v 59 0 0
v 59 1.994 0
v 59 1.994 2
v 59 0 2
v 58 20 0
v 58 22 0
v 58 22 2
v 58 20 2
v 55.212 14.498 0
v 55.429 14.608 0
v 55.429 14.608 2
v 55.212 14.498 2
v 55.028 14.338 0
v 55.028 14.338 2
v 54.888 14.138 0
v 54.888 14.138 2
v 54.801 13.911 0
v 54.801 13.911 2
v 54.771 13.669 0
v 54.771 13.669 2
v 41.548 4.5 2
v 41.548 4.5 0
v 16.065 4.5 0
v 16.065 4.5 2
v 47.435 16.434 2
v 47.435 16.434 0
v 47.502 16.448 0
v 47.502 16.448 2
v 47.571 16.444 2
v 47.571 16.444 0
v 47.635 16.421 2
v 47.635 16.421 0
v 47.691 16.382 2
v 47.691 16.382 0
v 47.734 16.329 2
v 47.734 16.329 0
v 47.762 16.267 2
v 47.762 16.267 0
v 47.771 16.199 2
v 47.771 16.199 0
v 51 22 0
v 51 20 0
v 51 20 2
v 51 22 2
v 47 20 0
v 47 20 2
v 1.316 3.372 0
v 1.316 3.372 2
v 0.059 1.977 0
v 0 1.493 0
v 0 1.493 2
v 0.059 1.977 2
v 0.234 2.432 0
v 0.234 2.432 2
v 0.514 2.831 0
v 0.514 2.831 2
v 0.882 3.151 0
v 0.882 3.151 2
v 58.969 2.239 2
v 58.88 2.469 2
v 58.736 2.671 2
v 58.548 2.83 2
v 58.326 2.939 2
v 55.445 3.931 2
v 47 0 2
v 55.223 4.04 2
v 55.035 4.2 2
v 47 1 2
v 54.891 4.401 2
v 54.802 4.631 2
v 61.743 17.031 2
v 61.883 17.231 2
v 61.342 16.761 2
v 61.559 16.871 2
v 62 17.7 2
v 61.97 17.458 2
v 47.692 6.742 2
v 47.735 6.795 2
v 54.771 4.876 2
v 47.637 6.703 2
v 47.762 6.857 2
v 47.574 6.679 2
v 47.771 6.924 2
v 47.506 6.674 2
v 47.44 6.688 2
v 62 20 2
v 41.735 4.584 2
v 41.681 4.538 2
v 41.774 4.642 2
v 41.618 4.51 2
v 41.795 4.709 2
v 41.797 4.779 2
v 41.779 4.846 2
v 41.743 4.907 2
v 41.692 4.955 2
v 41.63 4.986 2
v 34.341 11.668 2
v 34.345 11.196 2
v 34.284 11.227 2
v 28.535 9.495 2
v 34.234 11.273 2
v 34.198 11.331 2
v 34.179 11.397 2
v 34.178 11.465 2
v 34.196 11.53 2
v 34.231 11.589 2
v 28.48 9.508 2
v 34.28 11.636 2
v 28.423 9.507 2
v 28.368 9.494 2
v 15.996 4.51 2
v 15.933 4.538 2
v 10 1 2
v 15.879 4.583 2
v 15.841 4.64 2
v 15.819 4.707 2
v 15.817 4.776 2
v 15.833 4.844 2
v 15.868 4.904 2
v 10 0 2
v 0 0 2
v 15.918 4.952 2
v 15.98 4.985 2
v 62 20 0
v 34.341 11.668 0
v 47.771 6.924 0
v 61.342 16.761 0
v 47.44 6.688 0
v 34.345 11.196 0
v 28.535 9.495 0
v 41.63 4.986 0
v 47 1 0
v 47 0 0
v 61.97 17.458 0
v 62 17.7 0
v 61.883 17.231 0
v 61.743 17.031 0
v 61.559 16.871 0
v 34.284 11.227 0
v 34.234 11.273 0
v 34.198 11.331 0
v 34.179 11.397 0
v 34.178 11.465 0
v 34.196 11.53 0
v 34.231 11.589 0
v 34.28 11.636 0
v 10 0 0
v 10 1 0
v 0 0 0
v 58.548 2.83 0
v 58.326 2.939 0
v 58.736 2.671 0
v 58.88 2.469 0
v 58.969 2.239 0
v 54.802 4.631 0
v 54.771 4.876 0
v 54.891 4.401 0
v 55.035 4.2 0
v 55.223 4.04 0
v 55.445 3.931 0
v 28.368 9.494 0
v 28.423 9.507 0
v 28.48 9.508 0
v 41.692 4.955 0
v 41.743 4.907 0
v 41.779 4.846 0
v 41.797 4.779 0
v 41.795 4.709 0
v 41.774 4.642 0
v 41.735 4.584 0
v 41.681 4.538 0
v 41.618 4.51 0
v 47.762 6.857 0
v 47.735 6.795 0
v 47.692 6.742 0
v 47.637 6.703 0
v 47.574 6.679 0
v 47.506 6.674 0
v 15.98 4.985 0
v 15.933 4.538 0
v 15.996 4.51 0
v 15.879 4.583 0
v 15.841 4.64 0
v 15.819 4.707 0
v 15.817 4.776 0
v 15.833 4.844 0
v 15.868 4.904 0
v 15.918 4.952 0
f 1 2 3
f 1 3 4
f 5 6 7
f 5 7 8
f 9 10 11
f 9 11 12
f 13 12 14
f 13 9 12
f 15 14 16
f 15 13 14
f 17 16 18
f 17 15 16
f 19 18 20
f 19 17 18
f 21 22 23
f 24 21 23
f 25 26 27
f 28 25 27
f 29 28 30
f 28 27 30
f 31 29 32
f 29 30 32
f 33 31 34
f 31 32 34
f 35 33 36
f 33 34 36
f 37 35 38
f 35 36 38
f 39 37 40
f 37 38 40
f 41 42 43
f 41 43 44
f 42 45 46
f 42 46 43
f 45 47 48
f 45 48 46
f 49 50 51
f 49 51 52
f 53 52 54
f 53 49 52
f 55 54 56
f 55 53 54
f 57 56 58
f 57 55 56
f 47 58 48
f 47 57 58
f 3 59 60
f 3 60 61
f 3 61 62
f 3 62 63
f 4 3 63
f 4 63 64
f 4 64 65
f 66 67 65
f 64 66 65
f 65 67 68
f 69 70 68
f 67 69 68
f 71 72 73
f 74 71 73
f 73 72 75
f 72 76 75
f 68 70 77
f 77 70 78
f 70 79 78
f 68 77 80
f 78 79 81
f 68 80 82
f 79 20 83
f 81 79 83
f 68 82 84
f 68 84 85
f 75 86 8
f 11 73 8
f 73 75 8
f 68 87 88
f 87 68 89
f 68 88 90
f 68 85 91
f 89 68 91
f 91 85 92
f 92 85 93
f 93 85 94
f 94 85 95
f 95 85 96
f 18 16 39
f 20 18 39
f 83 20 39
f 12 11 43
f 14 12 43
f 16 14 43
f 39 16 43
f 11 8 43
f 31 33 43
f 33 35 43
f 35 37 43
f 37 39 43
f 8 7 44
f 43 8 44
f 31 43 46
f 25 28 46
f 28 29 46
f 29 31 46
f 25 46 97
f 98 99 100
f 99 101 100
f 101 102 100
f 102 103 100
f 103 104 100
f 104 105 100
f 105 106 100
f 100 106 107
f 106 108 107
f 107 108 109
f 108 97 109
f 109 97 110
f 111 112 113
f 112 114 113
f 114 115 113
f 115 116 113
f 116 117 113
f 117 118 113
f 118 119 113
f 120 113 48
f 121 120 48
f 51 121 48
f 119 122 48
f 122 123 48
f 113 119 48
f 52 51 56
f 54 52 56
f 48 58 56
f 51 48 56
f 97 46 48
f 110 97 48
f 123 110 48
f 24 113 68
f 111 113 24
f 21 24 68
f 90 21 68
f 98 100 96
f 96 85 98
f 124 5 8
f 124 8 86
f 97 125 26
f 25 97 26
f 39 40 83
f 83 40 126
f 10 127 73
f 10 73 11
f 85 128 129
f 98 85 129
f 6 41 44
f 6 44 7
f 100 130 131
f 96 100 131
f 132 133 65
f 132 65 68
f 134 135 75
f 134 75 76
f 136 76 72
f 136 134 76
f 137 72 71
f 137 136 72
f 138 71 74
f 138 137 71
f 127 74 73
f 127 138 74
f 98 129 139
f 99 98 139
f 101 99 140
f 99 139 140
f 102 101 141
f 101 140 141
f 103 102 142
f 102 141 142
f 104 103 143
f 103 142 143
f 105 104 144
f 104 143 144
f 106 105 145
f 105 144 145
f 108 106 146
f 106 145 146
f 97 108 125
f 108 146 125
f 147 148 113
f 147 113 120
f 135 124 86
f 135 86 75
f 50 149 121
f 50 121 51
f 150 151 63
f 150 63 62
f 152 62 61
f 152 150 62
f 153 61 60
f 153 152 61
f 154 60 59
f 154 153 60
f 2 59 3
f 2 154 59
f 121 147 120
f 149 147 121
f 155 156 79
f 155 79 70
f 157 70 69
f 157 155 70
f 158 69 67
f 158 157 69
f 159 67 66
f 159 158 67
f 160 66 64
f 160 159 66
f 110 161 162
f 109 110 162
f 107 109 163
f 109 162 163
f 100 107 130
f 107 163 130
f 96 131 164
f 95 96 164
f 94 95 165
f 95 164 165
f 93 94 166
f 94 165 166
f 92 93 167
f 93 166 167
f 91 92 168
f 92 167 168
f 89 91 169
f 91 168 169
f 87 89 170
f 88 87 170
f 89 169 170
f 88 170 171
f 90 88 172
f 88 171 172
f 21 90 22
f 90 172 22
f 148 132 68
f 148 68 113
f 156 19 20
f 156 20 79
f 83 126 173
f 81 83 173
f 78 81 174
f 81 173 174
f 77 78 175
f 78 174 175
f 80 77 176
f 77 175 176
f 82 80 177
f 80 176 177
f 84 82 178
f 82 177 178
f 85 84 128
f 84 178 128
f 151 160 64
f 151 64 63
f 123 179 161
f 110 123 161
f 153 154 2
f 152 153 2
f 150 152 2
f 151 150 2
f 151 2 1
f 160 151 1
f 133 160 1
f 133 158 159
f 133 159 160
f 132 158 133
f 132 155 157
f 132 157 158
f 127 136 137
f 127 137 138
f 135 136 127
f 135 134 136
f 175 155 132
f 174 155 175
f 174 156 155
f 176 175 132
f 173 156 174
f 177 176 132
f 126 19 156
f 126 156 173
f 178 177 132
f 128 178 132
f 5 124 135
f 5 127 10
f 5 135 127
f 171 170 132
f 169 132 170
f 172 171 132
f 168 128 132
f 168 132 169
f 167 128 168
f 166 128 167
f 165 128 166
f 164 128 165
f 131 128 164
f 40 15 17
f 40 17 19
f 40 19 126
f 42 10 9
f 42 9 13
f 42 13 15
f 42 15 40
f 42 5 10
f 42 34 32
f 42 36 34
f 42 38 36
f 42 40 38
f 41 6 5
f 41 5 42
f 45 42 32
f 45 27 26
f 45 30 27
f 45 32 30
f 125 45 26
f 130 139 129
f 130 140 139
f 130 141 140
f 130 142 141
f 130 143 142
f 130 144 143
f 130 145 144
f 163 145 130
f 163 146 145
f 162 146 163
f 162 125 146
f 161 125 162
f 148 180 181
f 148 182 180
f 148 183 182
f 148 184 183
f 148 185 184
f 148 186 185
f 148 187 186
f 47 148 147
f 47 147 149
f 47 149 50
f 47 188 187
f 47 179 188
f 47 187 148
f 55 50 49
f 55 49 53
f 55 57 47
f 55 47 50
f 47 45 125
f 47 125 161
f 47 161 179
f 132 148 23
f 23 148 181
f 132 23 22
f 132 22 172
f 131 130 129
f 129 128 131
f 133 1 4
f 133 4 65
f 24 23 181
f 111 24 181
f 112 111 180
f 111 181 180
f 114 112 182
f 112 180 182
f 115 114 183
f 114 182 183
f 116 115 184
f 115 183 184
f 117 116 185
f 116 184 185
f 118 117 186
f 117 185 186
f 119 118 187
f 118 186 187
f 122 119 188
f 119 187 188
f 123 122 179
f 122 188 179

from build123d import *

# Parameters (mm, degrees)
BOSS_EXTRUDE1_DEPTH = 2


with BuildPart() as part:
    # Sketch1 → Boss-Extrude1 (new body)
    with BuildSketch(Plane.XY):
        with BuildLine():
            Line((1.315959713, 3.372369155), (47, 20))
            Line((47, 20), (51, 20))
            Line((51, 20), (51, 22))
            Line((51, 22), (58, 22))
            Line((58, 22), (58, 20))
            Line((58, 20), (62, 20))
            Line((62, 20), (62, 17.700207538))
            ThreePointArc((62, 17.700207538), (61.819152044, 17.126631102), (61.342020143, 16.760514917))
            Line((61.342020143, 16.760514917), (55.428944301, 14.608331318))
            ThreePointArc((55.428944301, 14.608331318), (54.9518124, 14.242215134), (54.770964445, 13.668638697))
            Line((54.770964445, 13.668638697), (54.770964445, 4.876414251))
            ThreePointArc((54.770964445, 4.876414251), (54.956848926, 4.295711295), (55.44539629, 3.930895675))
            Line((55.44539629, 3.930895675), (58.325568154, 2.939172971))
            ThreePointArc((58.325568154, 2.939172971), (58.814115518, 2.574357351), (59, 1.993654396))
            Line((59, 1.993654396), (59, 0))
            Line((59, 0), (47, 0))
            Line((47, 0), (47, 1))
            Line((47, 1), (10, 1))
            Line((10, 1), (10, 0))
            Line((10, 0), (0, 0))
            Line((0, 0), (0, 1.492983913))
            ThreePointArc((0, 1.492983913), (0.361695911, 2.640136786), (1.315959713, 3.372369155))
        make_face()
        with BuildLine():
            Line((15.979730818, 4.984923155), (28.367873469, 9.493838338))
            ThreePointArc((28.367873469, 9.493838338), (28.451196871, 9.508905664), (28.534770543, 9.495294827))
            Line((28.534770543, 9.495294827), (41.629611064, 4.986379644))
            ThreePointArc((41.629611064, 4.986379644), (41.794790425, 4.708738099), (41.548219025, 4.5))
            Line((41.548219025, 4.5), (16.065235854, 4.5))
            ThreePointArc((16.065235854, 4.5), (15.819033916, 4.706587956), (15.979730818, 4.984923155))
        make_face(mode=Mode.SUBTRACT)
        with BuildLine():
            Line((47.770964445, 16.198948904), (47.770964445, 6.92390155))
            ThreePointArc((47.770964445, 6.92390155), (47.666140184, 6.72037267), (47.439572406, 6.687521906))
            Line((47.439572406, 6.687521906), (34.344731886, 11.196437088))
            ThreePointArc((34.344731886, 11.196437088), (34.176133444, 11.430635098), (34.340618889, 11.667739888))
            Line((34.340618889, 11.667739888), (47.435459409, 16.433872059))
            ThreePointArc((47.435459409, 16.433872059), (47.664358554, 16.403736915), (47.770964445, 16.198948904))
        make_face(mode=Mode.SUBTRACT)
    extrude(amount=BOSS_EXTRUDE1_DEPTH)


solid = part.part
